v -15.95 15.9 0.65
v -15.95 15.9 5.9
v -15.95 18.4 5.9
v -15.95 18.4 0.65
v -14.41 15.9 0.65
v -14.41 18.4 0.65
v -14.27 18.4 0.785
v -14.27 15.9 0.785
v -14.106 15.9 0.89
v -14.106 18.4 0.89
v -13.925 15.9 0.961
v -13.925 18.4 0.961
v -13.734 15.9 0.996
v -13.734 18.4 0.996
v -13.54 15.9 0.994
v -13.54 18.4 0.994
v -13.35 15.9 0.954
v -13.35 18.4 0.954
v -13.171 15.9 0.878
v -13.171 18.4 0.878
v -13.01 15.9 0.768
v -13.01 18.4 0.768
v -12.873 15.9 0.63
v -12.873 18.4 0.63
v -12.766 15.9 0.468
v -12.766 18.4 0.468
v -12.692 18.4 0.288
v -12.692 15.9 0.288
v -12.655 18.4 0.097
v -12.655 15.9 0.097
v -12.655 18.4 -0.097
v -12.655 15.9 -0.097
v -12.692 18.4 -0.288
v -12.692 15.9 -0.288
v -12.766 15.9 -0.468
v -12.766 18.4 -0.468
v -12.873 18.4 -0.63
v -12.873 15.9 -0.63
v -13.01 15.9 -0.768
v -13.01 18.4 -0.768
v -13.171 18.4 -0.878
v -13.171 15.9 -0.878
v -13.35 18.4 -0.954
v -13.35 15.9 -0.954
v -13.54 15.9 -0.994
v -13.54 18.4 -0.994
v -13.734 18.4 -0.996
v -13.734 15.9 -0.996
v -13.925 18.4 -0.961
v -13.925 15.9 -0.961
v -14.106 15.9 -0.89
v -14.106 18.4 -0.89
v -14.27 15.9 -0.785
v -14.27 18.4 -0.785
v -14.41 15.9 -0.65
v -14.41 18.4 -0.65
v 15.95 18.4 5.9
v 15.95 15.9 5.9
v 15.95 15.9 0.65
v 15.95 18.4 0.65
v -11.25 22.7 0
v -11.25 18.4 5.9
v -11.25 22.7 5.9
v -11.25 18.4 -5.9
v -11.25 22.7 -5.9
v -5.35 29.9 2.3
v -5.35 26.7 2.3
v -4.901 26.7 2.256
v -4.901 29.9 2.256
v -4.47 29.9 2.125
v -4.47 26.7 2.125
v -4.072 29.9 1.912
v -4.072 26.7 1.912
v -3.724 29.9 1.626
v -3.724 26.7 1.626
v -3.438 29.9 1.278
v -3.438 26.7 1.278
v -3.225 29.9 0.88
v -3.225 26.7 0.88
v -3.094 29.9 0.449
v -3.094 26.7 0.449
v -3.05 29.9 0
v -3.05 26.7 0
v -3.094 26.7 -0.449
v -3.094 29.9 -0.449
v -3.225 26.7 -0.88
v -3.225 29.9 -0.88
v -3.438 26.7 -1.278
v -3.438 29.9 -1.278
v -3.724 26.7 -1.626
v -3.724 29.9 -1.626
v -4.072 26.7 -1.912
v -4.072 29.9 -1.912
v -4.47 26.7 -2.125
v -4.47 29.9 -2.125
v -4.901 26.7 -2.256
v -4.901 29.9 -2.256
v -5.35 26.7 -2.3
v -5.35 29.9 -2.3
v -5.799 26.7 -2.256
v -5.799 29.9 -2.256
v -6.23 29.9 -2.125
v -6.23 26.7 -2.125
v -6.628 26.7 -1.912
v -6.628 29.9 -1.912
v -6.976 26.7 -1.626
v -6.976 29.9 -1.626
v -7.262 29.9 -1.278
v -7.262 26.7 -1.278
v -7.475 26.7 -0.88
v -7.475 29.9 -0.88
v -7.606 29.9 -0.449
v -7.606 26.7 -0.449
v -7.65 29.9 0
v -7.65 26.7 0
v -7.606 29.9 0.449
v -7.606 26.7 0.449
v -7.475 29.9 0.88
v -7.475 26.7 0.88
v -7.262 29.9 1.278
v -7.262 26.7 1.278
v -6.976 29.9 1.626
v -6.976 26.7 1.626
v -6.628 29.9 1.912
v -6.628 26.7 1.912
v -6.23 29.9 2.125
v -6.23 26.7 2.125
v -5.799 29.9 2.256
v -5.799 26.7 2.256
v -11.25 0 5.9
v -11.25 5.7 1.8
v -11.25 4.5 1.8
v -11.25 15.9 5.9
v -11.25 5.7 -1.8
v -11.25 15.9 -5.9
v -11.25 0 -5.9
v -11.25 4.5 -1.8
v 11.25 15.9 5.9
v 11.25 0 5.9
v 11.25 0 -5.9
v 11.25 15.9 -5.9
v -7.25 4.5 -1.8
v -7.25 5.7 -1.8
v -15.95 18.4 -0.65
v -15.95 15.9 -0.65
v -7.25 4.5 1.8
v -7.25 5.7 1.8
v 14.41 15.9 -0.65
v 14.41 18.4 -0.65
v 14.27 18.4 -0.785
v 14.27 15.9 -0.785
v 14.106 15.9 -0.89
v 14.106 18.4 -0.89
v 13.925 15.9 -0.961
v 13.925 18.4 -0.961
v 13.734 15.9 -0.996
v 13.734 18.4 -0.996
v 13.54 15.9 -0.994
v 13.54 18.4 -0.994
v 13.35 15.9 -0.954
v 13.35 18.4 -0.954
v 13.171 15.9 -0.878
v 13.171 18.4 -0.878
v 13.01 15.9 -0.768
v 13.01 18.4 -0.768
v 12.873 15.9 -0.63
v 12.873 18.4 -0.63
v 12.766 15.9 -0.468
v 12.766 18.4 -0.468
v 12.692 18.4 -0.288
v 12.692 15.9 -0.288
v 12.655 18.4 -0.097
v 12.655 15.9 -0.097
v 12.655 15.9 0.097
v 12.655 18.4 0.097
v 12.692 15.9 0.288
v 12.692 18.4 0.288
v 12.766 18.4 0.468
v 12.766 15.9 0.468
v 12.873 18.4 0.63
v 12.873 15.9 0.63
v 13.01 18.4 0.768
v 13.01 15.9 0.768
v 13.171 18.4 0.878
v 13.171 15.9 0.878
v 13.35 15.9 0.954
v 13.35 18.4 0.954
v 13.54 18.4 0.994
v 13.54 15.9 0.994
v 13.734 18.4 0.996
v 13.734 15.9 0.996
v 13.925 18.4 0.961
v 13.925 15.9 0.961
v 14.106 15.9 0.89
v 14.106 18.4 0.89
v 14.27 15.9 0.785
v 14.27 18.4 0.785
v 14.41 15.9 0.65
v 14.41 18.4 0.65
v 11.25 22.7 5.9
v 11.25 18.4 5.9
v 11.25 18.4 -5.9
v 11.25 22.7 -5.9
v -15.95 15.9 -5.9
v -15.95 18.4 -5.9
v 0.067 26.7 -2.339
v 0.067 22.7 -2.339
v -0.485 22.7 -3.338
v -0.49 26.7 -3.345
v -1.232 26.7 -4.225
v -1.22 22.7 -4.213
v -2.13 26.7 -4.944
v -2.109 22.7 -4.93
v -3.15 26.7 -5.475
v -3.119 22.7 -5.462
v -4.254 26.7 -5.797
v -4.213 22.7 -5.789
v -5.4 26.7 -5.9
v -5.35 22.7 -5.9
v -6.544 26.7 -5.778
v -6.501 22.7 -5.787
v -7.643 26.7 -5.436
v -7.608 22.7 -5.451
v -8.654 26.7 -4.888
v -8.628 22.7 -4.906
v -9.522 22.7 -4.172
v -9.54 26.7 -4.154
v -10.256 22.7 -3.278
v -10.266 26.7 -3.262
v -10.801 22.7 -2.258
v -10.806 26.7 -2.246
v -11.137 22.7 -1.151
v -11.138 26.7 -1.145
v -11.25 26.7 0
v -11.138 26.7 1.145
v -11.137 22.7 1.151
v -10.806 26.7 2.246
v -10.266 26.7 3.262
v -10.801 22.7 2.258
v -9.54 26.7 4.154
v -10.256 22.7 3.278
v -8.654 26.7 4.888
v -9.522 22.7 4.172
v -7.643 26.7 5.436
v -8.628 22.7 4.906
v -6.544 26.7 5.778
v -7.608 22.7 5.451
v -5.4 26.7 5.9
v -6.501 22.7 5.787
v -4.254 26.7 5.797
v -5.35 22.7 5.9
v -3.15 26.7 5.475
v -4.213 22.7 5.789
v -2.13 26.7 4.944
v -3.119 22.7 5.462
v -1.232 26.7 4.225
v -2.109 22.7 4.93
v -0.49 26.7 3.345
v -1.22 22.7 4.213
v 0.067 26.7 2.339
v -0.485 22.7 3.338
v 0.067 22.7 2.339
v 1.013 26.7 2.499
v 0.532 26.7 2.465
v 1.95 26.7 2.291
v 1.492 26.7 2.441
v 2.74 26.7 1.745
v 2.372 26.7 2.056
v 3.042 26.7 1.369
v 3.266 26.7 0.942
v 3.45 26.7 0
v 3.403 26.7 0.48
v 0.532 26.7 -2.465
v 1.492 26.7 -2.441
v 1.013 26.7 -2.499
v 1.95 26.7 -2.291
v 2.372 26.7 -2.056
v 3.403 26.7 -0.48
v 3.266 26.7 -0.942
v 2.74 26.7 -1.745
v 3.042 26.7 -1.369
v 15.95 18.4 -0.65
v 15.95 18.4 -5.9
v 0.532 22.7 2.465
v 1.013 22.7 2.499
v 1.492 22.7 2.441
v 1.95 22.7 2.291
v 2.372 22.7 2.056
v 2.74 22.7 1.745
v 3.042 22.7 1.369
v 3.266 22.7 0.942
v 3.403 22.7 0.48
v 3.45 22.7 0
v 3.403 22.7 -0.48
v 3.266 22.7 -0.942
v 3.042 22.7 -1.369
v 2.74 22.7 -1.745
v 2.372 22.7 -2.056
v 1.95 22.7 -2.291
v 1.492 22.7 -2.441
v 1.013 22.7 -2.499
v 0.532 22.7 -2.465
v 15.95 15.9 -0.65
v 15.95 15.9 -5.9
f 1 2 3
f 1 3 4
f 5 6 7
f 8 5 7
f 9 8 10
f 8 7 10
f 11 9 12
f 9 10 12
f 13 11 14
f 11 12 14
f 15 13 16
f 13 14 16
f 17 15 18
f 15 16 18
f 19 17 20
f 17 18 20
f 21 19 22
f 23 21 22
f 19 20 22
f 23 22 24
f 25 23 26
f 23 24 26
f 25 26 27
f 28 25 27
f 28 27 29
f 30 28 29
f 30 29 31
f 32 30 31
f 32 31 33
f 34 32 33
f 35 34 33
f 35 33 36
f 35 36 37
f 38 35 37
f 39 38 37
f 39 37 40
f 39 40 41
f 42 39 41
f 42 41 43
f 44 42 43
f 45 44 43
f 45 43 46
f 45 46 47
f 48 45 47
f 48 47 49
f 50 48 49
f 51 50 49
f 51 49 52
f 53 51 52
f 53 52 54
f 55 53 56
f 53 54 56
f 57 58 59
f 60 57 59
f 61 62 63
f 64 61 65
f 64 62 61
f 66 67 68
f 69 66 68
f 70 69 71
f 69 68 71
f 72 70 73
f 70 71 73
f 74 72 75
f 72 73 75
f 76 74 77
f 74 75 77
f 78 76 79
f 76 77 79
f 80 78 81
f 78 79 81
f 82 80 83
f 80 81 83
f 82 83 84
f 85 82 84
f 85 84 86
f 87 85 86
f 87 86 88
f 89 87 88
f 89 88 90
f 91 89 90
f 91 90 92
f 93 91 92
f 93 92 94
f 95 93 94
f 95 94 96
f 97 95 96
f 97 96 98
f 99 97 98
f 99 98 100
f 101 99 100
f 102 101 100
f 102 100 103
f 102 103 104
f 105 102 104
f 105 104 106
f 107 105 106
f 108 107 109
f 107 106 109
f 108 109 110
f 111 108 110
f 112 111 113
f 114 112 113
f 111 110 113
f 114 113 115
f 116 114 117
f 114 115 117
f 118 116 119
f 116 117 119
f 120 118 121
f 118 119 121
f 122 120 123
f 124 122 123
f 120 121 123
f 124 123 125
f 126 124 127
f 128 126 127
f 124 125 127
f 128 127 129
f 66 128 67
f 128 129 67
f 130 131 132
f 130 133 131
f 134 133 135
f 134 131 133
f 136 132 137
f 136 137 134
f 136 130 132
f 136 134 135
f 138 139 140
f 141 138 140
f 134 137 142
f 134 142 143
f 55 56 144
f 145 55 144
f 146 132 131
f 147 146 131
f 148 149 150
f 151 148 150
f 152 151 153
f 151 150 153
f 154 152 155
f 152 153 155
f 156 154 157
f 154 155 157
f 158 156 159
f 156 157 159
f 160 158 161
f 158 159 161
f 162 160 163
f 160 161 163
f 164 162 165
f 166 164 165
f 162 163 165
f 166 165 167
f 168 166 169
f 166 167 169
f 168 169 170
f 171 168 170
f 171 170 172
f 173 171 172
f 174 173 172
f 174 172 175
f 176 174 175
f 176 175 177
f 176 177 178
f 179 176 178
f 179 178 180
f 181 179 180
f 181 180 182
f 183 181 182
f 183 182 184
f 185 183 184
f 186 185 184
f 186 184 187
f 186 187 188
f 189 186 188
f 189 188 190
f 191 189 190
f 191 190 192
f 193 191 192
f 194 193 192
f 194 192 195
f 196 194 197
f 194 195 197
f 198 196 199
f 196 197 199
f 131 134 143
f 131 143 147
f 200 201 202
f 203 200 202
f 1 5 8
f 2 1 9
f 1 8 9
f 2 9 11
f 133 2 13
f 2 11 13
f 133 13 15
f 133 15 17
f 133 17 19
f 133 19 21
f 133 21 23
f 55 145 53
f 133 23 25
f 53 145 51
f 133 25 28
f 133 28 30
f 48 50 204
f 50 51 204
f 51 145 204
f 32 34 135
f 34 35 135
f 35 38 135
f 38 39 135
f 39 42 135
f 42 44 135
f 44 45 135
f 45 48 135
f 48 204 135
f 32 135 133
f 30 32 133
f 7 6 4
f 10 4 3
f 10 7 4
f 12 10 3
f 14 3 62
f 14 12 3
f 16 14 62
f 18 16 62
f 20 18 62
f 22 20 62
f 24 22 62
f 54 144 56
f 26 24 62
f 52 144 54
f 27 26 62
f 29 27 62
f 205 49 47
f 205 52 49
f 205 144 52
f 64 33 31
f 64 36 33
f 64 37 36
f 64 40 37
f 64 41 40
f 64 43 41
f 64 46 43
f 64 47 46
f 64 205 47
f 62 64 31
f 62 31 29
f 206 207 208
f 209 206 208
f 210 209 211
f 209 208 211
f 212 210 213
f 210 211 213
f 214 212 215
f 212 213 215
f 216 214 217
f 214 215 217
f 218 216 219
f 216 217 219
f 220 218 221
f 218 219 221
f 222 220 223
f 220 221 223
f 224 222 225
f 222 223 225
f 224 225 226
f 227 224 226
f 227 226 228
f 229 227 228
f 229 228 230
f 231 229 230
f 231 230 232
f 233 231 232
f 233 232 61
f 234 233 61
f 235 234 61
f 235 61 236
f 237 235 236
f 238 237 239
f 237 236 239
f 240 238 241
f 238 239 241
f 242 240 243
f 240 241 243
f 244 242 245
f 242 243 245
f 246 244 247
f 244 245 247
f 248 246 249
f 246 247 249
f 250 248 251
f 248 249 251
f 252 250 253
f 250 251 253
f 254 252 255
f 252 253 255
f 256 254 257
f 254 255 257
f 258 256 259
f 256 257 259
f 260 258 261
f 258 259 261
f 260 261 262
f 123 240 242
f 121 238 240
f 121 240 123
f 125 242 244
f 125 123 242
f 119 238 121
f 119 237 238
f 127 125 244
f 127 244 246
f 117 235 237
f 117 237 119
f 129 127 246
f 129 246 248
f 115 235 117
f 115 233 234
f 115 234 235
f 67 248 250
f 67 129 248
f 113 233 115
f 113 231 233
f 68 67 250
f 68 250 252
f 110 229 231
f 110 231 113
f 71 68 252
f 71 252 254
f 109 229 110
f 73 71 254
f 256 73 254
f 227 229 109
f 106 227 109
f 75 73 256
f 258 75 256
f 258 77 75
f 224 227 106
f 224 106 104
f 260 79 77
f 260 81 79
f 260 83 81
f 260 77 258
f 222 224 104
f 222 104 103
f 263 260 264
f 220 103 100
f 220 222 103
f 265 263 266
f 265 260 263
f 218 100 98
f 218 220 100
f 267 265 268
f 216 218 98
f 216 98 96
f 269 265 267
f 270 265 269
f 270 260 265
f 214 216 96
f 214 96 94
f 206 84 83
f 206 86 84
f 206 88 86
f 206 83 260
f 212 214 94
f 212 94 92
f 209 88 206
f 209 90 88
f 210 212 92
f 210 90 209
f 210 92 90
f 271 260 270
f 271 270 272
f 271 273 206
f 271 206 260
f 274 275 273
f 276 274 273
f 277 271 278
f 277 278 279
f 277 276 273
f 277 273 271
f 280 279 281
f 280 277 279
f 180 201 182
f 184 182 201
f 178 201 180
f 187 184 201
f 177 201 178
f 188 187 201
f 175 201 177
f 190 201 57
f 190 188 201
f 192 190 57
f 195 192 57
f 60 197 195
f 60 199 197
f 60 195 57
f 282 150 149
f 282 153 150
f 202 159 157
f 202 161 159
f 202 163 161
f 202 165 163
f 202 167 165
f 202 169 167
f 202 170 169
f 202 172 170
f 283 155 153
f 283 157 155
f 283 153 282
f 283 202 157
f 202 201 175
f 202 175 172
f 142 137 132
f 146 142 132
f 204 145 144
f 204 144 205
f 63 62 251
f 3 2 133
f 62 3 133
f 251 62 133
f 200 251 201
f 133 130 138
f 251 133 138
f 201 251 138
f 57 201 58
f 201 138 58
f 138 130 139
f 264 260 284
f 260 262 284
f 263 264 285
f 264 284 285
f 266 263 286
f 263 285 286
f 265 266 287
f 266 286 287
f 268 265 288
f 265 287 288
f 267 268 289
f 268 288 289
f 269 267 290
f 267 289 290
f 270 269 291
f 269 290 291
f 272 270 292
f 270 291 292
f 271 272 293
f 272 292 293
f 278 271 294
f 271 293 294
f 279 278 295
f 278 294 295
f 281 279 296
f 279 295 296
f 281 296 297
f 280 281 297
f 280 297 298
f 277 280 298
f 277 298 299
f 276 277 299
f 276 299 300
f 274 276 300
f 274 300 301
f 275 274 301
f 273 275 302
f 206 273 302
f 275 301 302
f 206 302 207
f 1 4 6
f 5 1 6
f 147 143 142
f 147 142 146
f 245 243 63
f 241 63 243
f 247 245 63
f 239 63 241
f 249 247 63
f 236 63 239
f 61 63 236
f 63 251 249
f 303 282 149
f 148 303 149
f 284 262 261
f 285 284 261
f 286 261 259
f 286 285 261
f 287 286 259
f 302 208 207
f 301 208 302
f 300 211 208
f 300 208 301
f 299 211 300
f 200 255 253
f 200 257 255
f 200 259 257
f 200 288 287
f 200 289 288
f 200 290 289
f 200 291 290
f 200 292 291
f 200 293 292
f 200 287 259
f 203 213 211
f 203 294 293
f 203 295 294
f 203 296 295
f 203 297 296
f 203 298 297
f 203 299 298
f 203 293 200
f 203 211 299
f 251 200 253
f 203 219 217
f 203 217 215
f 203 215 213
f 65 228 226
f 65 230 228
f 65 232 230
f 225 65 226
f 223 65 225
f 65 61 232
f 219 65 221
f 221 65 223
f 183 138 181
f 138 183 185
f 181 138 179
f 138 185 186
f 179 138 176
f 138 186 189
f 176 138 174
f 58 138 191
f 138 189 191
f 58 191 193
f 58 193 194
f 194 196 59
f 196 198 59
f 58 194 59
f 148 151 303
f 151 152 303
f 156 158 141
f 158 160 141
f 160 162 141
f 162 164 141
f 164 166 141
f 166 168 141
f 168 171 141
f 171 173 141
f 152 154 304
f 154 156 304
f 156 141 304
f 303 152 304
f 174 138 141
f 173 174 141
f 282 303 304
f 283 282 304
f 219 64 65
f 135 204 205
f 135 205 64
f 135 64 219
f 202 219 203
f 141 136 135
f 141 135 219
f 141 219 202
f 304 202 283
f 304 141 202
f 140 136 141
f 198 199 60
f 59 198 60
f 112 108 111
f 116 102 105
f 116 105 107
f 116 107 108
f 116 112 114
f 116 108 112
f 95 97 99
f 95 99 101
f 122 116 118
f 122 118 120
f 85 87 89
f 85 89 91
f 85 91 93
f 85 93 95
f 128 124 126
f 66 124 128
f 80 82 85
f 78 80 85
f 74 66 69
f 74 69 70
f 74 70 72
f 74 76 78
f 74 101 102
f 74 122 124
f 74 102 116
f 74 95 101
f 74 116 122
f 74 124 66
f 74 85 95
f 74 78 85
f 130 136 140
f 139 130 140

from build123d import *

# Parameters (mm, degrees)
SKETCH1_W           = 22.5
SKETCH1_H           = 11.8
BOSS_EXTRUDE1_DEPTH = 22.7
BOSS_EXTRUDE2_START = 15.9
SKETCH2_W           = 31.9
SKETCH2_H           = 11.8
BOSS_EXTRUDE2_DEPTH = 2.5
CUT_EXTRUDE1_DEPTH  = 26.055388642
SKETCH4_R           = 2.3
BOSS_EXTRUDE3_DEPTH = 4
SKETCH4_3_R         = 2.3
BOSS_EXTRUDE4_DEPTH = 7.2
SKETCH5_W           = 3.6
SKETCH5_H           = 1.2
CUT_EXTRUDE2_DEPTH  = 4


with BuildPart() as part:
    # Sketch1 → Boss-Extrude1 (new body)
    with BuildSketch(Plane(origin=(0, 0, 0), x_dir=(1, 0, 0), z_dir=(0, 1, 0))):
        Rectangle(SKETCH1_W, SKETCH1_H)
    extrude(amount=BOSS_EXTRUDE1_DEPTH)

    # Sketch2 → Boss-Extrude2 (add)
    with BuildSketch(Plane(origin=(0, 0, 0), x_dir=(1, 0, 0), z_dir=(0, 1, 0)).offset(BOSS_EXTRUDE2_START)):
        Rectangle(SKETCH2_W, SKETCH2_H)
    extrude(amount=BOSS_EXTRUDE2_DEPTH)

    # Sketch3 → Cut-Extrude1 (cut, through all)
    with BuildSketch(Plane(origin=(0, 18.4, 0), x_dir=(1, 0, 0), z_dir=(0, 1, 0))):
        with BuildLine():
            Line((-14.409934208, 0.65), (-15.95, 0.65))
            Line((-15.95, 0.65), (-15.95, -0.65))
            Line((-15.95, -0.65), (-14.409934208, -0.65))
            ThreePointArc((-14.409934208, -0.65), (-12.65, 0), (-14.409934208, 0.65))
        make_face()
        with BuildLine():
            Line((14.409934208, -0.65), (15.95, -0.65))
            Line((15.95, -0.65), (15.95, 0.65))
            Line((15.95, 0.65), (14.409934208, 0.65))
            ThreePointArc((14.409934208, 0.65), (12.65, 0), (14.409934208, -0.65))
        make_face()
    extrude(amount=-CUT_EXTRUDE1_DEPTH, mode=Mode.SUBTRACT)

    # Sketch4 → Boss-Extrude3 (add)
    with BuildSketch(Plane(origin=(0, 22.7, 0), x_dir=(1, 0, 0), z_dir=(0, 1, 0))):
        with BuildLine():
            ThreePointArc((0.066666667, 2.338743727), (-11.25, 0), (0.066666667, -2.338743727))
            ThreePointArc((0.066666667, -2.338743727), (3.45, 0), (0.066666667, 2.338743727))
        make_face()
        with Locations((-5.35, 0)):
            Circle(SKETCH4_R, mode=Mode.SUBTRACT)
    extrude(amount=BOSS_EXTRUDE3_DEPTH)

    # Sketch4<3> → Boss-Extrude4 (add)
    with BuildSketch(Plane(origin=(0, 22.7, 0), x_dir=(1, 0, 0), z_dir=(0, 1, 0))):
        with Locations((-5.35, 0)):
            Circle(SKETCH4_3_R)
    extrude(amount=BOSS_EXTRUDE4_DEPTH)

    # Sketch5 → Cut-Extrude2 (cut)
    with BuildSketch(Plane.ZY.offset(11.25)):
        with Locations((0, 5.1)):
            Rectangle(SKETCH5_W, SKETCH5_H)
    extrude(amount=-CUT_EXTRUDE2_DEPTH, mode=Mode.SUBTRACT)


solid = part.part
